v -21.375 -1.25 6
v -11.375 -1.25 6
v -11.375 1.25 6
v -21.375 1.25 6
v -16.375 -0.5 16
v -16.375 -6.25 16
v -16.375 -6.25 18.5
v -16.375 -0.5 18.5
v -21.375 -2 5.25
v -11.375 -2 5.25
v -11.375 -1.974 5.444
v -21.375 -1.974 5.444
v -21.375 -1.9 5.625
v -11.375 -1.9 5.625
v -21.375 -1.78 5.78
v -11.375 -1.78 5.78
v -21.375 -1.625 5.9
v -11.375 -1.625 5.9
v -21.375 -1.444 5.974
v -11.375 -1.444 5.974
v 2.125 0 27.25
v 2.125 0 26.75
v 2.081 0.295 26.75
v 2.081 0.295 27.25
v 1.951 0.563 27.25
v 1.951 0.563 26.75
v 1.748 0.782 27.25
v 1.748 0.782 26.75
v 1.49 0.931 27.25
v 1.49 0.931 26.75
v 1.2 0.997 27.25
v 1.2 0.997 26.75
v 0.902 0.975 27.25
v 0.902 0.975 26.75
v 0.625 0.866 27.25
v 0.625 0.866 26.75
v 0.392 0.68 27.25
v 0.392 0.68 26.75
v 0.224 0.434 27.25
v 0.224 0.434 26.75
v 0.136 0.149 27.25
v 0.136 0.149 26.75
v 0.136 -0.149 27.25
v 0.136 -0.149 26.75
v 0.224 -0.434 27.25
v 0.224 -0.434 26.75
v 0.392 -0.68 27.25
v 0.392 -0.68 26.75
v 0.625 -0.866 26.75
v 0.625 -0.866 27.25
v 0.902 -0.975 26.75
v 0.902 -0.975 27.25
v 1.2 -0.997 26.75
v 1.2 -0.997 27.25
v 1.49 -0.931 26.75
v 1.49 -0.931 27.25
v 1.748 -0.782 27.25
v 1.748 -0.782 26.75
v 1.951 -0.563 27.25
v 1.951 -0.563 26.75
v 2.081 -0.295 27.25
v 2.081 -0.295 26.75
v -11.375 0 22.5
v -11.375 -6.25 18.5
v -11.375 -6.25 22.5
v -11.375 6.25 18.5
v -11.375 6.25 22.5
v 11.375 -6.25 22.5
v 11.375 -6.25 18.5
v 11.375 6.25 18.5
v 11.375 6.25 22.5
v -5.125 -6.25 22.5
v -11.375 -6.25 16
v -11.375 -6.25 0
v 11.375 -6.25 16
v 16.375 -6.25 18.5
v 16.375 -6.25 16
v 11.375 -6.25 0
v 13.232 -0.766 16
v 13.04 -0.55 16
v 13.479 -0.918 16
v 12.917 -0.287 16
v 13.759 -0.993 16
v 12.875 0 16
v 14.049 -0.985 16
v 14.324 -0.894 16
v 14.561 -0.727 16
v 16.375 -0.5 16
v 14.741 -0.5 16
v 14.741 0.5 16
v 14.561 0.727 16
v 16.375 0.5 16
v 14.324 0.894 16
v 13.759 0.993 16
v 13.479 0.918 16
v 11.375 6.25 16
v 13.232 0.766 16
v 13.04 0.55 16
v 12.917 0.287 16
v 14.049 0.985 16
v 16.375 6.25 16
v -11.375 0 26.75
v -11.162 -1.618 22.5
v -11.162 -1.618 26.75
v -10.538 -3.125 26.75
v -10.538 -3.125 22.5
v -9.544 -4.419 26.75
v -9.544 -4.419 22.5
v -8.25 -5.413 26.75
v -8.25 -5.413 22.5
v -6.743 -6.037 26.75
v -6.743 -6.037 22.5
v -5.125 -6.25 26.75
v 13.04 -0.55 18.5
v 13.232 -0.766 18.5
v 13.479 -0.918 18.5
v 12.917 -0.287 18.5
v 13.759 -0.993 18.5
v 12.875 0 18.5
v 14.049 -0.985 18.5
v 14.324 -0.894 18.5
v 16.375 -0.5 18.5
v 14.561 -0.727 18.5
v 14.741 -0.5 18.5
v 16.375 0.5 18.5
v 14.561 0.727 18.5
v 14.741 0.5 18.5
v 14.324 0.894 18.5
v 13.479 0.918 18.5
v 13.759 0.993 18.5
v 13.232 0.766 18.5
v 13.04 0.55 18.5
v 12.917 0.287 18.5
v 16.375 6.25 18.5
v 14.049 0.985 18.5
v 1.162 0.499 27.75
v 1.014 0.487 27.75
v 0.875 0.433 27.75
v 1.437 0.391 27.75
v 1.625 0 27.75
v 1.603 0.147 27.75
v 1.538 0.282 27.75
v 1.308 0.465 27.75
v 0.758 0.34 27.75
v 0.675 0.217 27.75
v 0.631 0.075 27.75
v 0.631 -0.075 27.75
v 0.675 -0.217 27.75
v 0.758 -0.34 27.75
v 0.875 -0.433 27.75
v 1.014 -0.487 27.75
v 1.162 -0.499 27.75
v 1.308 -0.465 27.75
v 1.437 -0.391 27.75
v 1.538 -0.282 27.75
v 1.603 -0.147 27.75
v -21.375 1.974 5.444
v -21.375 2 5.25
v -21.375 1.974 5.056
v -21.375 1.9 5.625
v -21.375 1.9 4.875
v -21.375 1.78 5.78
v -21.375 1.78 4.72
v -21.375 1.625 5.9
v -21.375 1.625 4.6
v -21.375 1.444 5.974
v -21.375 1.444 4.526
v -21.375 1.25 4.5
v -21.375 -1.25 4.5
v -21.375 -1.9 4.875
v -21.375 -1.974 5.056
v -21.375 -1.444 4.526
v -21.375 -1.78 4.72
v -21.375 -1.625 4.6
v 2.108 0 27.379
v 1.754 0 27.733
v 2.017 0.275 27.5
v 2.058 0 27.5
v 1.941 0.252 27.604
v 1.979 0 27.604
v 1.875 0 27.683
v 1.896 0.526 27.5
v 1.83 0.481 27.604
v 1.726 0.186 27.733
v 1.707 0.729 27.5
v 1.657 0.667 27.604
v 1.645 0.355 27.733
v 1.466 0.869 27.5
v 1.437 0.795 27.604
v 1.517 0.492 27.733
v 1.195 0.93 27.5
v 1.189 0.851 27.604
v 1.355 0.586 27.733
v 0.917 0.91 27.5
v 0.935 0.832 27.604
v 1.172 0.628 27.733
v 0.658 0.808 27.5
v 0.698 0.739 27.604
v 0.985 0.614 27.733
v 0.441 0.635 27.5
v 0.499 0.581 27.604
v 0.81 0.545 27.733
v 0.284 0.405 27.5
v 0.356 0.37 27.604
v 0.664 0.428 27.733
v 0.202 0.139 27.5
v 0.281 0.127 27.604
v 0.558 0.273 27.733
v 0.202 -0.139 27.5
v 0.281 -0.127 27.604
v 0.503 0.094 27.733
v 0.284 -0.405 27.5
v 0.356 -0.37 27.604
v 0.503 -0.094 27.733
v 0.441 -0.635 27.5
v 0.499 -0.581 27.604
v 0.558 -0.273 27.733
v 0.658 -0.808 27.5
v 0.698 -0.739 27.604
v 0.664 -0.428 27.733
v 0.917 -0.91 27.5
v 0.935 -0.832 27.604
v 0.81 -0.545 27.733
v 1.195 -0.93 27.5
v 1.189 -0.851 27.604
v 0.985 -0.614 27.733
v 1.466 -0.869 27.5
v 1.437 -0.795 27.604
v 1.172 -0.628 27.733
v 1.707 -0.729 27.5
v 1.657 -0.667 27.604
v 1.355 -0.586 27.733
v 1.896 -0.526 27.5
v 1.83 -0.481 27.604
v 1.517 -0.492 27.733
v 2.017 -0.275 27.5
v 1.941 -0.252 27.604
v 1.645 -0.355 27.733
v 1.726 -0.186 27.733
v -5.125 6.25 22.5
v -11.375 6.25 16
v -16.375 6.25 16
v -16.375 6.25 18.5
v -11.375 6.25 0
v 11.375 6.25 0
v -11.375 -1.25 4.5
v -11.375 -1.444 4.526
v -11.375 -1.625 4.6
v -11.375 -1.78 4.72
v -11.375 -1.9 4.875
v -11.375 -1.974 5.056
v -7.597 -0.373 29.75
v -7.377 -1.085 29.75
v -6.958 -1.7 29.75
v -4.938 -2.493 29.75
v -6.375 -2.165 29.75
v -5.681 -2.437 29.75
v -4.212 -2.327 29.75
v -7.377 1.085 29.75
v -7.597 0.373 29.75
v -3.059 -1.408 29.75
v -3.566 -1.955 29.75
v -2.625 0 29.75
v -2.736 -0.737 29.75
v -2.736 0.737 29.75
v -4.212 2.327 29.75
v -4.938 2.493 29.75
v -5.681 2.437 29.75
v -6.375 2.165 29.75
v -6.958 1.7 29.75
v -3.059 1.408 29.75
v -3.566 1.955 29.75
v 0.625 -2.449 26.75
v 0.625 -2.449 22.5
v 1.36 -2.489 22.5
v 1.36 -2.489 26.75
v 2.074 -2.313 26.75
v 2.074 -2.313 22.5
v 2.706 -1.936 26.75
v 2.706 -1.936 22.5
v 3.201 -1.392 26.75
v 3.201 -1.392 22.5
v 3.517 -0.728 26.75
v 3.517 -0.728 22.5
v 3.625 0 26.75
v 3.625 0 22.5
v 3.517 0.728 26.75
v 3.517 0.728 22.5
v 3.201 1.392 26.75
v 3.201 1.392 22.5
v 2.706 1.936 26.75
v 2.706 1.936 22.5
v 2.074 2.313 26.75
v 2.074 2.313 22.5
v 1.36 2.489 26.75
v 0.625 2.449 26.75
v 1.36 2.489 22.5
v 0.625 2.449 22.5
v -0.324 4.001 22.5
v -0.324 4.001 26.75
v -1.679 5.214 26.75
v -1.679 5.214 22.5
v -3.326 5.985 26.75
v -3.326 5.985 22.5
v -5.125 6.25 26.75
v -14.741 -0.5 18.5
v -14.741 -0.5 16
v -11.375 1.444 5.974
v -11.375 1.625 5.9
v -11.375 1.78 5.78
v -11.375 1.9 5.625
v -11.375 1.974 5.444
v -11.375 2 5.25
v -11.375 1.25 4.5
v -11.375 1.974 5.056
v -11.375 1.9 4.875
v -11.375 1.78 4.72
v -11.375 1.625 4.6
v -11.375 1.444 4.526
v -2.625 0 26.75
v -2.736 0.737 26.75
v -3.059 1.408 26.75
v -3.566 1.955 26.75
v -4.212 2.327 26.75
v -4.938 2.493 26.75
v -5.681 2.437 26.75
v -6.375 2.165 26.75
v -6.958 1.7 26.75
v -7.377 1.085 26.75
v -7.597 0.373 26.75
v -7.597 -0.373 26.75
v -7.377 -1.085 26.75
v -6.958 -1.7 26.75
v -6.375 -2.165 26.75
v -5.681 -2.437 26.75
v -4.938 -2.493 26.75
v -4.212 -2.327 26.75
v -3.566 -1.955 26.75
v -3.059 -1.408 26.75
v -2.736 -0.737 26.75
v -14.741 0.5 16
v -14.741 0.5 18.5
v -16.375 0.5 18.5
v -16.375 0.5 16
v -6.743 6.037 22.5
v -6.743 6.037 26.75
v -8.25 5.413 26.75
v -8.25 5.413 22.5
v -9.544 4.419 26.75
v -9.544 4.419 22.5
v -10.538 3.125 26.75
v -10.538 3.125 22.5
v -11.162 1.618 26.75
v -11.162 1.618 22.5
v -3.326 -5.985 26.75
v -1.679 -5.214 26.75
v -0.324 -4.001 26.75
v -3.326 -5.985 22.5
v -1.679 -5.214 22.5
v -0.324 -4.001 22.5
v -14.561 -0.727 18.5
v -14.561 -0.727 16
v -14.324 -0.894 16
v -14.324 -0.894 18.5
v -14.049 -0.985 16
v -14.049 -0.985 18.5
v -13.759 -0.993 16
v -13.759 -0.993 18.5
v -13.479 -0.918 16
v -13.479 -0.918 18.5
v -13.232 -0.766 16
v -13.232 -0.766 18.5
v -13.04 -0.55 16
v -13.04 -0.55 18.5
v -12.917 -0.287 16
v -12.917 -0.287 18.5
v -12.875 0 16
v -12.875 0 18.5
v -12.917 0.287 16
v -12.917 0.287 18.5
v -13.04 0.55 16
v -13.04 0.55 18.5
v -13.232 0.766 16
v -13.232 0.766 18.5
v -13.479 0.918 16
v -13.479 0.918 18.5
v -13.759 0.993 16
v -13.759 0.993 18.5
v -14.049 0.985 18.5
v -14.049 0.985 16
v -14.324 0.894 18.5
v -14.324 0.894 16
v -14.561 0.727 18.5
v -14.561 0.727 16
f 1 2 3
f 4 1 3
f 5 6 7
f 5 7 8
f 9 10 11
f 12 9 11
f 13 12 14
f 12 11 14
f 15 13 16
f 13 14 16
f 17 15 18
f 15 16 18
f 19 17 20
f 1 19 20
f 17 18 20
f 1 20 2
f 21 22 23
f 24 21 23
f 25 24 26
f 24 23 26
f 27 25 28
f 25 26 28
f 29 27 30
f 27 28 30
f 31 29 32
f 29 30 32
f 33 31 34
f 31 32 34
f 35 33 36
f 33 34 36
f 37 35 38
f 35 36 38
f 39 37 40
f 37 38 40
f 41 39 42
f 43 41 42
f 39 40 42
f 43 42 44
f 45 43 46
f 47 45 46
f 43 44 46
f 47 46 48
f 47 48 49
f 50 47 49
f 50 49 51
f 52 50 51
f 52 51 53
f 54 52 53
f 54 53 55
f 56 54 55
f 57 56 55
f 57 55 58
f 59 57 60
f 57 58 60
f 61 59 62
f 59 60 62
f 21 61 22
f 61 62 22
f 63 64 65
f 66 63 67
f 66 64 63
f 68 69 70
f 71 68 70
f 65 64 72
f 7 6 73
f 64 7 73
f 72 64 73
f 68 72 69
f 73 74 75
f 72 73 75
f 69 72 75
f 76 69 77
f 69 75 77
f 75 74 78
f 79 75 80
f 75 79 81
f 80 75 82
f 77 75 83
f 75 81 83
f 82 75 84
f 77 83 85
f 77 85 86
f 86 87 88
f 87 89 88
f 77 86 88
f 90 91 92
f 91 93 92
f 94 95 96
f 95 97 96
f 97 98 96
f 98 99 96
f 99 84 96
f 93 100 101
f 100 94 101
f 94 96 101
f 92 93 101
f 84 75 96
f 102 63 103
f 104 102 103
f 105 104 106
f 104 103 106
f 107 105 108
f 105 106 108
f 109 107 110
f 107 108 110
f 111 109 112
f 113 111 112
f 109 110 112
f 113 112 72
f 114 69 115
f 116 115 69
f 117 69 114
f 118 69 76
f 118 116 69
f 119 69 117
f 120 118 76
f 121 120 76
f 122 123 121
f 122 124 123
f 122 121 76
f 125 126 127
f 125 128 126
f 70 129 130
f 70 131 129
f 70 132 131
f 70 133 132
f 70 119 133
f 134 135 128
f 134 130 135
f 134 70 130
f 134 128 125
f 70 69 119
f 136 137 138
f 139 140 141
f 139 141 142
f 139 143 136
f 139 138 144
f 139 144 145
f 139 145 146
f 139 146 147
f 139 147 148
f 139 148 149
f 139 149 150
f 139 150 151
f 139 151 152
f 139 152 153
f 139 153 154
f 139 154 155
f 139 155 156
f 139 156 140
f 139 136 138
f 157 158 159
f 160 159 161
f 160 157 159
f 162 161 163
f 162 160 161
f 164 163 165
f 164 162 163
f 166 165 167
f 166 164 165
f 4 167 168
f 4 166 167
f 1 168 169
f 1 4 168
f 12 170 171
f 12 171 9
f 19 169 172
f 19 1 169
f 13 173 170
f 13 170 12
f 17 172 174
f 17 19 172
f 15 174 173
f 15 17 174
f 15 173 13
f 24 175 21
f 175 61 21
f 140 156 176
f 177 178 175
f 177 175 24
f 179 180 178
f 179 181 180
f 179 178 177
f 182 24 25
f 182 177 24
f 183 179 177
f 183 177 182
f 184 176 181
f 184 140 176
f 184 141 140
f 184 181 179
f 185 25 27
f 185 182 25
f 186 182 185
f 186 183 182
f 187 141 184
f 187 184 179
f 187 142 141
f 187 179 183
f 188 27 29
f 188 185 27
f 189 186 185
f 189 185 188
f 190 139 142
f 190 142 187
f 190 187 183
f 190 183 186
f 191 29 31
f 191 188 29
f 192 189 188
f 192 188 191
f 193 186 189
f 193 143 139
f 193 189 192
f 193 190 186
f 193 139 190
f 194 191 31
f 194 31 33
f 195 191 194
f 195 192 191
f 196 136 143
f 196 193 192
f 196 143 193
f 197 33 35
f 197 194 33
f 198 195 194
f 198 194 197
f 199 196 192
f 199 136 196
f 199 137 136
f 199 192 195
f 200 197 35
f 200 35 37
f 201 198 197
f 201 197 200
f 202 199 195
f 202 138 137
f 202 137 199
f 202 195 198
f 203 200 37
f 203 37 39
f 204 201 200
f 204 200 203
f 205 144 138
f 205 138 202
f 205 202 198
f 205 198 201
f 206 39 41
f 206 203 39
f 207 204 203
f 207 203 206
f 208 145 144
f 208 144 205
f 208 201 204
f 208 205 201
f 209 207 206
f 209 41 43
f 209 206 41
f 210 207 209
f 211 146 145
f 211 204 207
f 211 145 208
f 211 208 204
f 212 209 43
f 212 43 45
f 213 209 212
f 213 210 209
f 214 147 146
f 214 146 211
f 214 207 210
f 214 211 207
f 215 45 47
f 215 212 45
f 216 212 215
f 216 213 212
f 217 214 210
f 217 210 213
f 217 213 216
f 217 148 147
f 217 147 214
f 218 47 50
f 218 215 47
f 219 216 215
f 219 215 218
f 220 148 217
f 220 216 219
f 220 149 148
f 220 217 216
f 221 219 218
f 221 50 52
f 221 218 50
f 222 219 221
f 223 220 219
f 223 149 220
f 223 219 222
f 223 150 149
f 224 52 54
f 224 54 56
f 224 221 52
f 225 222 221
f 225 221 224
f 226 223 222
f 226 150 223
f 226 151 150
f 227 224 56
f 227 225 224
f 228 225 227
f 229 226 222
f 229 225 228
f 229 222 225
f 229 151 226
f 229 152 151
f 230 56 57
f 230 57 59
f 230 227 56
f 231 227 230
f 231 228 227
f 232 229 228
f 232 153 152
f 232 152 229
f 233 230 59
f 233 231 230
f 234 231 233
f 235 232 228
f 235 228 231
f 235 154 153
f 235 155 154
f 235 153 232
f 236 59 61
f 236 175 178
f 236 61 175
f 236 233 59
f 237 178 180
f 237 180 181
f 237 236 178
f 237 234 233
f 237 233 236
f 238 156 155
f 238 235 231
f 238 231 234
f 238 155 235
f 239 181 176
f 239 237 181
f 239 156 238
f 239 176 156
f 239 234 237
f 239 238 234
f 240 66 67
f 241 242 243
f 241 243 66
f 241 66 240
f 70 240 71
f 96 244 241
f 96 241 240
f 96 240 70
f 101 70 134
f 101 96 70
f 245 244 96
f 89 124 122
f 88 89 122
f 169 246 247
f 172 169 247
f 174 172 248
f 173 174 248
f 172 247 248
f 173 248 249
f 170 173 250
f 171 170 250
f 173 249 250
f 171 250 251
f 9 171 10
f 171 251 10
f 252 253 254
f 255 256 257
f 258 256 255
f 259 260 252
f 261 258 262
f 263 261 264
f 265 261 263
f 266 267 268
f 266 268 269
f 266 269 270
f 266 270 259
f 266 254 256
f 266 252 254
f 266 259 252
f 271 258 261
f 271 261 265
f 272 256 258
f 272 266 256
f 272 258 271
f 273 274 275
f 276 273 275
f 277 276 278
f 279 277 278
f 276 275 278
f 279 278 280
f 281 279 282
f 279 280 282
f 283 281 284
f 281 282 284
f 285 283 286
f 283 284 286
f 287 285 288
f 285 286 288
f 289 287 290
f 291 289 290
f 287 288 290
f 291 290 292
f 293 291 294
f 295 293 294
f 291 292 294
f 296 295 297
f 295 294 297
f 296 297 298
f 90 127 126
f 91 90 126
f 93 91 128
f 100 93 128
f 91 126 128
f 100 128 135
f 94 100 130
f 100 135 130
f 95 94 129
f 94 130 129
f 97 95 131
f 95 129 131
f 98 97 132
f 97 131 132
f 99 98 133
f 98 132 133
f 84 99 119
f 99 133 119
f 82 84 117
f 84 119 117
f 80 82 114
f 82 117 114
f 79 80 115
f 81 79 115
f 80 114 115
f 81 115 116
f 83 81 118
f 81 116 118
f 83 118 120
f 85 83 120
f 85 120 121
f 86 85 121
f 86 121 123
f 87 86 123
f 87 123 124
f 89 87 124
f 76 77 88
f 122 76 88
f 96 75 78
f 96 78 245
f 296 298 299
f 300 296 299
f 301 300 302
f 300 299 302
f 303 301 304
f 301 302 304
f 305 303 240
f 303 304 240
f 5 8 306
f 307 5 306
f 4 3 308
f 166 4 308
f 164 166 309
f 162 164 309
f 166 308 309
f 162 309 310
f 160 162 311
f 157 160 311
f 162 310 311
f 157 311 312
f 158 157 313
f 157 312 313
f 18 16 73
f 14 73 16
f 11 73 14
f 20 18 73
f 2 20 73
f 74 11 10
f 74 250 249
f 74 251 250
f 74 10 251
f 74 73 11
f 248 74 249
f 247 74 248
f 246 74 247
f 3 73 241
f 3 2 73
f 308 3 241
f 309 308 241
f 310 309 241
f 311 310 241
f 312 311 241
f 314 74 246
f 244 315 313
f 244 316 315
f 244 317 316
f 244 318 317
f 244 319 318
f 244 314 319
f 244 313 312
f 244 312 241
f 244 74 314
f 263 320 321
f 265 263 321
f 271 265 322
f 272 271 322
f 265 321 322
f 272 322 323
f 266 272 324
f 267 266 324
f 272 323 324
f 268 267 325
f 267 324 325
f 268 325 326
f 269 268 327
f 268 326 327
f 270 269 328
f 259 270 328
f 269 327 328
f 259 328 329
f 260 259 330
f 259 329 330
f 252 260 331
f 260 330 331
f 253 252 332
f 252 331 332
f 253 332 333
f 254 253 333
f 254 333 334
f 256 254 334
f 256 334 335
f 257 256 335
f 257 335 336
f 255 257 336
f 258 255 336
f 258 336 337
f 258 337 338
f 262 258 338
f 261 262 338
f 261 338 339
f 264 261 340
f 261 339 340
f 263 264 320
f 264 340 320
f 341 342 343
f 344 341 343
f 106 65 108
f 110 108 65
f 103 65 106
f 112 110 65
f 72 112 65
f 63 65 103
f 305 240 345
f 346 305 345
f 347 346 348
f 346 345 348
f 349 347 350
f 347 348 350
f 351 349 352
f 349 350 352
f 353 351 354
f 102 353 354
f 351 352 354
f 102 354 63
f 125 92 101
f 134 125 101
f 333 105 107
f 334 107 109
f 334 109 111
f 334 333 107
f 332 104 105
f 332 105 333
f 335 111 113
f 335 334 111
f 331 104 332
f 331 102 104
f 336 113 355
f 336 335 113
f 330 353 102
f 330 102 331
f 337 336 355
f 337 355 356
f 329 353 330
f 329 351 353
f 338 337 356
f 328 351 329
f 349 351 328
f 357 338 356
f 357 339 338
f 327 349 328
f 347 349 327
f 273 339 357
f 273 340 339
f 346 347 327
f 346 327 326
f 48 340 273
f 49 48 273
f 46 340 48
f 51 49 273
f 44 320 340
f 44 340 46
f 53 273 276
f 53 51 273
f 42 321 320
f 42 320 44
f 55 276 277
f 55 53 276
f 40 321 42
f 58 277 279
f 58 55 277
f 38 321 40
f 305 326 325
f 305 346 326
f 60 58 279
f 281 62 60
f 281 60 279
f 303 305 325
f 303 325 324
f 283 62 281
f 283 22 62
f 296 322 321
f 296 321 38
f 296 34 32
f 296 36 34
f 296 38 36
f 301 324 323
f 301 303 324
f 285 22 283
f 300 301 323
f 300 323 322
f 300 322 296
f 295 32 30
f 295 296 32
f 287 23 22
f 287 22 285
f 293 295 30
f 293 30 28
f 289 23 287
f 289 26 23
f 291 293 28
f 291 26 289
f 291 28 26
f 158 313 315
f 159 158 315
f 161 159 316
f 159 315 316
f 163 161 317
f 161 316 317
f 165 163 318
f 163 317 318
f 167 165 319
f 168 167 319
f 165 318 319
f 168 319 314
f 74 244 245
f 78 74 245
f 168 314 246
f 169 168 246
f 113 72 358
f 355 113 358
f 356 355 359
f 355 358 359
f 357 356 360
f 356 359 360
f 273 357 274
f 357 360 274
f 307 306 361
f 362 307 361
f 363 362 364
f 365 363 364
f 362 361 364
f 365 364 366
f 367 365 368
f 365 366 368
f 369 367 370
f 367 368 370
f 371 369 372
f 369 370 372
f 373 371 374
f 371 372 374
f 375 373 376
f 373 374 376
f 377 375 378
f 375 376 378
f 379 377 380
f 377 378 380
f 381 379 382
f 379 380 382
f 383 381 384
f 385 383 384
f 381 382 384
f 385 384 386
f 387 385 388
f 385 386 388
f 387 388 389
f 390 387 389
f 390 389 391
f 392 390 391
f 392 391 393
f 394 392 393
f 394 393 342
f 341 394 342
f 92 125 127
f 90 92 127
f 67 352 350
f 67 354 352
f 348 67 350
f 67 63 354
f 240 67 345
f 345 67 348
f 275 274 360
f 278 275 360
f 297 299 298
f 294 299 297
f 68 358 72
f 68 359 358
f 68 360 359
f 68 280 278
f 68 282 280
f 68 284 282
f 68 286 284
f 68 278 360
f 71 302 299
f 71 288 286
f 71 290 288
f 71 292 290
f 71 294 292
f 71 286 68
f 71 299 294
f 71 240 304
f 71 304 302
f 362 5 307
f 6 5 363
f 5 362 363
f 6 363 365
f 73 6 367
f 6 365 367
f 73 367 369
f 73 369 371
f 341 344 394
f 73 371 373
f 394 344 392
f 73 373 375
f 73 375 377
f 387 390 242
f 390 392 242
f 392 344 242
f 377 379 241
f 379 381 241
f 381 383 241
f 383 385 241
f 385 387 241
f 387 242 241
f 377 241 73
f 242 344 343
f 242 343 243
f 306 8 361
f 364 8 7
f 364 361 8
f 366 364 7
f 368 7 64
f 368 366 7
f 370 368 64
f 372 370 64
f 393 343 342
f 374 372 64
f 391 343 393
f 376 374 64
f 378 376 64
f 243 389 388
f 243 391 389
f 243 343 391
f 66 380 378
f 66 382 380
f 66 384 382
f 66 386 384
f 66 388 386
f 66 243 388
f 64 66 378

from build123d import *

# Parameters (mm, degrees)
F0_W      = 22.75
F0_H      = 12.5
F1_DEPTH  = 22.5
F3_W      = 5
F3_H      = 12.5
F4_DEPTH  = 2.5
F6_DEPTH  = 2.5
F8_DEPTH  = 4.25
F9_R      = 1
F10_DEPTH = 1
F11_R     = 2.5
F12_DEPTH = 3
F14_DEPTH = 10
F15_R     = 0.5


with BuildPart() as f1:
    # F0 (on Top) → F1 (new body)
    with BuildSketch(Plane.XY):
        Rectangle(F0_W, F0_H)
    extrude(amount=F1_DEPTH)

    # F3 (on offset) → F4 (join)
    with BuildSketch(Plane.XY.offset(16)):
        with Locations((-13.875, 0)):
            Rectangle(F3_W, F3_H)
        with Locations((13.875, 0)):
            Rectangle(F3_W, F3_H)
    extrude(amount=F4_DEPTH)

    # F5 (on face) → F6 (cut, through all)
    with BuildSketch(Plane.XY.offset(18.5)):
        with BuildLine():
            Line((-16.375, -0.5), (-14.741025, -0.5))
            ThreePointArc((-14.741025, -0.5), (-12.875, 0), (-14.741025, 0.5))
            Line((-14.741025, 0.5), (-16.375, 0.5))
            Line((-16.375, 0.5), (-16.375, -0.5))
        make_face()
        with BuildLine():
            Line((16.375, 0.5), (14.741025, 0.5))
            ThreePointArc((14.741025, 0.5), (12.875, 0), (14.741025, -0.5))
            Line((14.741025, -0.5), (16.375, -0.5))
            Line((16.375, -0.5), (16.375, 0.5))
        make_face()
    extrude(amount=-F6_DEPTH, mode=Mode.SUBTRACT)

    # F7 (on face) → F8 (join)
    with BuildSketch(Plane.XY.offset(22.5)):
        with BuildLine():
            ThreePointArc((0.625, -2.44949), (3.625, 0), (0.625, 2.44949))
            ThreePointArc((0.625, 2.44949), (-1.678756, 5.21401), (-5.125, 6.25))
            ThreePointArc((-5.125, 6.25), (-9.544417, 4.419417), (-11.375, 0))
            ThreePointArc((-11.375, 0), (-9.544417, -4.419417), (-5.125, -6.25))
            ThreePointArc((-5.125, -6.25), (-1.678756, -5.21401), (0.625, -2.44949))
        make_face()
    extrude(amount=F8_DEPTH)

    # F9 (on face) → F10 (join)
    with BuildSketch(Plane.XY.offset(26.75)):
        with Locations((1.125, 0)):
            Circle(F9_R)
    extrude(amount=F10_DEPTH)

    # F11 (on face) → F12 (join)
    with BuildSketch(Plane.XY.offset(26.75)):
        with Locations((-5.125, 0)):
            Circle(F11_R)
    extrude(amount=F12_DEPTH)

    # F13 (on face) → F14 (join)
    with BuildSketch(Plane(origin=(-11.375, 0, 0), x_dir=(0, -1, 0), z_dir=(-1, 0, 0))):
        with BuildLine():
            Line((1.25, 6), (-1.25, 6))
            ThreePointArc((-1.25, 6), (-1.78033, 5.78033), (-2, 5.25))
            ThreePointArc((-2, 5.25), (-1.78033, 4.71967), (-1.25, 4.5))
            Line((-1.25, 4.5), (1.25, 4.5))
            ThreePointArc((1.25, 4.5), (1.78033, 4.71967), (2, 5.25))
            ThreePointArc((2, 5.25), (1.78033, 5.78033), (1.25, 6))
        make_face()
    extrude(amount=F14_DEPTH)

    # F15
    f15_edges = [f1.edges().sort_by_distance(p)[0] for p in [
        (0.125, 0, 27.75),
    ]]
    fillet(f15_edges, radius=F15_R)


solid = f1.part
